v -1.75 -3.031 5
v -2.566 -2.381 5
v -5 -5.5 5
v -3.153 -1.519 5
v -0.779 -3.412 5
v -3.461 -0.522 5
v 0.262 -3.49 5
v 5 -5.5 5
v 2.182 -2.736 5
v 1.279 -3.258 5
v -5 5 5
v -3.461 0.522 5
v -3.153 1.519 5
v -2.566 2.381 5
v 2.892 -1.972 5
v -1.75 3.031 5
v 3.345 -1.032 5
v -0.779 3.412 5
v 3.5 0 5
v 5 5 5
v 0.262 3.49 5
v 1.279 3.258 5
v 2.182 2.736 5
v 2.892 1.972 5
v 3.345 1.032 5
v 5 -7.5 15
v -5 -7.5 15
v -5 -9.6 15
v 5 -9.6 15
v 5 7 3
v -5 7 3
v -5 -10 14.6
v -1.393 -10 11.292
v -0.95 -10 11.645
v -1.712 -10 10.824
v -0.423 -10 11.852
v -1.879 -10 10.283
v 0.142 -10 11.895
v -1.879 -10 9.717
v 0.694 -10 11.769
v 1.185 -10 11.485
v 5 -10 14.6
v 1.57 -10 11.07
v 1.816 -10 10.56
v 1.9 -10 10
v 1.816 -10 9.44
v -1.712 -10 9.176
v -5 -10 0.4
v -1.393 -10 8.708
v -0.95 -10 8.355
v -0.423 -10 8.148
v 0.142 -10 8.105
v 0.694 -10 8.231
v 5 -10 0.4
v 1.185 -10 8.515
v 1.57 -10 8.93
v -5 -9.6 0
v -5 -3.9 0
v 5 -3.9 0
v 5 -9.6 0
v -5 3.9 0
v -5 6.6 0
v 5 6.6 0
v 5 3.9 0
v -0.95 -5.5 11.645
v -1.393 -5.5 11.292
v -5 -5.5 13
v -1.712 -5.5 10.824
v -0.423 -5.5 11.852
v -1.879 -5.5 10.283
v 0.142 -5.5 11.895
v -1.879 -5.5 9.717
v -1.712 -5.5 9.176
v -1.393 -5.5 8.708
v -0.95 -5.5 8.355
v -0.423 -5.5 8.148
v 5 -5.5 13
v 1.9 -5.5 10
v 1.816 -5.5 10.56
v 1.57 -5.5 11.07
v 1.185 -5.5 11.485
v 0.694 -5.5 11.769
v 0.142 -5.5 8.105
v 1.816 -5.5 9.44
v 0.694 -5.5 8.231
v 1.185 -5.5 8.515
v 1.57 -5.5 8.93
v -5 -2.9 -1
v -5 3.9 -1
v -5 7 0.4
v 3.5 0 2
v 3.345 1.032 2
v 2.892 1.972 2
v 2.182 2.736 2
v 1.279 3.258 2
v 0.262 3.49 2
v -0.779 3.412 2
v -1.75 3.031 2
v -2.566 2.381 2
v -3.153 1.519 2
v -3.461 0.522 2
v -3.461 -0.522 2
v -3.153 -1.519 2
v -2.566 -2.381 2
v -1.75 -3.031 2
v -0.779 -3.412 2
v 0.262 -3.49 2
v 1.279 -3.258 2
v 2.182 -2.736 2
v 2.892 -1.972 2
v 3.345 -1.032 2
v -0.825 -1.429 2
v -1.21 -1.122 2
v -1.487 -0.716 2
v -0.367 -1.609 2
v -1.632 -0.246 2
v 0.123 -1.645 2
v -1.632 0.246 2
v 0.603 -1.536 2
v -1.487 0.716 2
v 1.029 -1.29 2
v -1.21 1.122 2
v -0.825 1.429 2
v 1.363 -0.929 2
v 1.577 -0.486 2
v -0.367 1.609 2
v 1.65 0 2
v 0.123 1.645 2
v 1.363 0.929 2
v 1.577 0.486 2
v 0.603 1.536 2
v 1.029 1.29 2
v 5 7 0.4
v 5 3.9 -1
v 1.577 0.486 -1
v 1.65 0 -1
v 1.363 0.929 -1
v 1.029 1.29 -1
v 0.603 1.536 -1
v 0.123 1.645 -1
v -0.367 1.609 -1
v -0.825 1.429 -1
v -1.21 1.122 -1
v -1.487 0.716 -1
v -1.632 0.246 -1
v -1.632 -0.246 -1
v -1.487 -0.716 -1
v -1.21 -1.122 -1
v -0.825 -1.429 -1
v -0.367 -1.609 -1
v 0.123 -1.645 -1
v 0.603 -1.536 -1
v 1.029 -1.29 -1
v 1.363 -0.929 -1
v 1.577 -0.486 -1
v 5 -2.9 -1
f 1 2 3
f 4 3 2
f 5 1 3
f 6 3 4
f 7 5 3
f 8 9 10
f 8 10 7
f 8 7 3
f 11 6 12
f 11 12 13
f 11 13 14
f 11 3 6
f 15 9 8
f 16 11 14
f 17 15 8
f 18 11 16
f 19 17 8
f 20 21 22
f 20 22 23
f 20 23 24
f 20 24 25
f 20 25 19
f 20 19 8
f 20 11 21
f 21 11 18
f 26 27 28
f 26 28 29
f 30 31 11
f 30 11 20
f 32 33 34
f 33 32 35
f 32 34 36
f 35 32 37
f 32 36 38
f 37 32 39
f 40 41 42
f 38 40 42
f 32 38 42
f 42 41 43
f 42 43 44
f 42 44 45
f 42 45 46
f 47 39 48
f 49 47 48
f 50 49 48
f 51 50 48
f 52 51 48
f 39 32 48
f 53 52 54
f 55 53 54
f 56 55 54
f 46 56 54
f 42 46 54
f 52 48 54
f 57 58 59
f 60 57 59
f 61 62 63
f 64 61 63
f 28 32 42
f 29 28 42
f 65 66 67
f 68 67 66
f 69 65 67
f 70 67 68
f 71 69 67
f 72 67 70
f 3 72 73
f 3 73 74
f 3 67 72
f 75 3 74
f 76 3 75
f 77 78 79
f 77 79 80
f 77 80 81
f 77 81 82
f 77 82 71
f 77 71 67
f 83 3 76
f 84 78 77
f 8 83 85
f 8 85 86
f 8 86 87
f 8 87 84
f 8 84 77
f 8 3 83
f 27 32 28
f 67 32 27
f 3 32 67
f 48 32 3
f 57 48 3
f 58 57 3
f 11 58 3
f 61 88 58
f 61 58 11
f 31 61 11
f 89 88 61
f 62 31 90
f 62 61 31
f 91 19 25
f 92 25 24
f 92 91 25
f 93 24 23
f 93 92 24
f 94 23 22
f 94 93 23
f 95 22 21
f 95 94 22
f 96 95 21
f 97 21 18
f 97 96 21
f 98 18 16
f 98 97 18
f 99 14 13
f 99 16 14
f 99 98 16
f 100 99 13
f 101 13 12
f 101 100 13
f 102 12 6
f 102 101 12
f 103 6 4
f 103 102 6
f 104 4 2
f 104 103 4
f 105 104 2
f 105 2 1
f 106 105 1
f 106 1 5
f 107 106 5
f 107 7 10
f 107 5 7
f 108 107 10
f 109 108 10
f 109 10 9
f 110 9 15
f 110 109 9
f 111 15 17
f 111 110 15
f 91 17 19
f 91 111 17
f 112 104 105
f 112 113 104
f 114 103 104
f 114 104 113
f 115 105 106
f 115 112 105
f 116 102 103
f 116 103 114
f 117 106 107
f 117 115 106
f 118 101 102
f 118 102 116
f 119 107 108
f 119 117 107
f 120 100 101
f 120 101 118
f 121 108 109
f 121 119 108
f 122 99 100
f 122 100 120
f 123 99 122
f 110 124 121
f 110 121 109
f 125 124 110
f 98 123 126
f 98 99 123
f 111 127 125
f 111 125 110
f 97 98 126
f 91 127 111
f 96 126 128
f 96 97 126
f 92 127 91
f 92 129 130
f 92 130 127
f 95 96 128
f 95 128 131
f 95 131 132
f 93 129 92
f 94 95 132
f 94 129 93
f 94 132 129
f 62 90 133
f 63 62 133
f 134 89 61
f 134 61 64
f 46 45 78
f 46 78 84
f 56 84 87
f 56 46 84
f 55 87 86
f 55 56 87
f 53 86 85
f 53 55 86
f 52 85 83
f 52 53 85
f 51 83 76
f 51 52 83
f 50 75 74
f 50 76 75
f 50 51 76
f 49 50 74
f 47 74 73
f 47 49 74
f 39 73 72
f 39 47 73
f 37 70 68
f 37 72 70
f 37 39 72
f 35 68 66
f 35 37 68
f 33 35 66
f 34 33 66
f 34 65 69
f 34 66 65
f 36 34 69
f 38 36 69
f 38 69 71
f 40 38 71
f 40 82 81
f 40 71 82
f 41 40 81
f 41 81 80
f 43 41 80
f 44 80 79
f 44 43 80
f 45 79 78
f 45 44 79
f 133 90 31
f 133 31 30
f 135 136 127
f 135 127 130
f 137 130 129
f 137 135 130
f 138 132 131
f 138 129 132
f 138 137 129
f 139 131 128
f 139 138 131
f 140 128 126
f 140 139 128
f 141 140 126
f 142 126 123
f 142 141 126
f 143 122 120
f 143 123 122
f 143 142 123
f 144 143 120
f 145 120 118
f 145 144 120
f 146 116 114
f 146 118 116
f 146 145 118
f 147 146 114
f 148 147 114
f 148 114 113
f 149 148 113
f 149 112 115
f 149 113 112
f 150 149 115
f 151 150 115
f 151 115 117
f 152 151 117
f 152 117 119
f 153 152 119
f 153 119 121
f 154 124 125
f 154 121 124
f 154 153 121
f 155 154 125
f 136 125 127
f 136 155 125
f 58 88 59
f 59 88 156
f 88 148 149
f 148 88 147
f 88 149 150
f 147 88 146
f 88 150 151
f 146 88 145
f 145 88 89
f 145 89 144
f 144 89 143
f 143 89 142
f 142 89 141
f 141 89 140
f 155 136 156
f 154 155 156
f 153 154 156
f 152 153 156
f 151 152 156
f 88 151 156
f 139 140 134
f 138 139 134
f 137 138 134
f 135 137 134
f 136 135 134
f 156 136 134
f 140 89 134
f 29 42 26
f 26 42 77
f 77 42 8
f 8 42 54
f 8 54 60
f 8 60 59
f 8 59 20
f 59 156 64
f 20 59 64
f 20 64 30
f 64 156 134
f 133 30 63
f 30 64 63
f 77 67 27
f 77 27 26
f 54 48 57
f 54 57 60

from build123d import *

# Parameters (mm, degrees)
CYLINDER006_R      = 1.65
CYLINDER006_DEPTH  = 10
CYLINDER007_R      = 3.5
CYLINDER007_DEPTH  = 10
CYLINDER008_R      = 1.9
CYLINDER008_DEPTH  = 10
BOX016_W           = 10
BOX016_H           = 16.5
BOX016_DEPTH       = 5
BOX017_W           = 10
BOX017_H           = 7.8
BOX017_DEPTH       = 2
CHAMFER003015_SIZE = 1
BOX015_W           = 10
BOX015_H           = 4.5
BOX015_DEPTH       = 15
CHAMFER003016_SIZE = 0.4
CHAMFER003017_SIZE = 2


with BuildPart() as cylinder006:
    # Cylinder006 → Cylinder006 (new body)
    with BuildSketch(Plane.XY.offset(-4)):
        Circle(CYLINDER006_R)
    extrude(amount=CYLINDER006_DEPTH)


with BuildPart() as fusion011:
    # Cylinder007 → Cylinder007 (new body)
    with BuildSketch(Plane.XY.offset(2)):
        Circle(CYLINDER007_R)
    extrude(amount=CYLINDER007_DEPTH)

    # Fusion011: union Cylinder006
    add(cylinder006.part)


with BuildPart() as cylinder008:
    # Cylinder008 → Cylinder008 (new body)
    with BuildSketch(Plane(origin=(0, -12, 10), x_dir=(1, 0, 0), z_dir=(0, 1, 0))):
        Circle(CYLINDER008_R)
    extrude(amount=CYLINDER008_DEPTH)


with BuildPart() as cube016:
    # Box016 → Box016 (new body)
    with BuildSketch(Plane(origin=(-5, -9.5, 0), x_dir=(1, 0, 0), z_dir=(0, 0, 1))):
        with Locations((5, 8.25)):
            Rectangle(BOX016_W, BOX016_H)
    extrude(amount=BOX016_DEPTH)


with BuildPart() as chamfer003015:
    # Box017 → Box017 (new body)
    with BuildSketch(Plane(origin=(-5, -3.9, -1), x_dir=(1, 0, 0), z_dir=(0, 0, 1))):
        with Locations((5, 3.9)):
            Rectangle(BOX017_W, BOX017_H)
    extrude(amount=BOX017_DEPTH)

    # Chamfer003015
    chamfer003015_edges = [chamfer003015.edges().sort_by_distance(p)[0] for p in [
        (0, -3.9, -1),
    ]]
    chamfer(chamfer003015_edges, length=CHAMFER003015_SIZE)


with BuildPart() as back_panel_support:
    # Box015 → Box015 (new body)
    with BuildSketch(Plane(origin=(-5, -10, 0), x_dir=(1, 0, 0), z_dir=(0, 0, 1))):
        with Locations((5, 2.25)):
            Rectangle(BOX015_W, BOX015_H)
    extrude(amount=BOX015_DEPTH)

    # Fusion012: union Cube016, Chamfer003015
    add(cube016.part)
    add(chamfer003015.part)

    # Chamfer003016
    chamfer003016_edges = [back_panel_support.edges().sort_by_distance(p)[0] for p in [
        (0, -10, 15),
        (0, -10, 0),
        (0, 7, 0),
    ]]
    chamfer(chamfer003016_edges, length=CHAMFER003016_SIZE)

    # Chamfer003017
    chamfer003017_edges = [back_panel_support.edges().sort_by_distance(p)[0] for p in [
        (0, -5.5, 15),
        (0, 7, 5),
    ]]
    chamfer(chamfer003017_edges, length=CHAMFER003017_SIZE)

    # Cut008004003004014002002005003004002: cut Cylinder008
    add(cylinder008.part, mode=Mode.SUBTRACT)

    # Cut008004003004014002002005003004003: cut Fusion011
    add(fusion011.part, mode=Mode.SUBTRACT)


solid = back_panel_support.part
